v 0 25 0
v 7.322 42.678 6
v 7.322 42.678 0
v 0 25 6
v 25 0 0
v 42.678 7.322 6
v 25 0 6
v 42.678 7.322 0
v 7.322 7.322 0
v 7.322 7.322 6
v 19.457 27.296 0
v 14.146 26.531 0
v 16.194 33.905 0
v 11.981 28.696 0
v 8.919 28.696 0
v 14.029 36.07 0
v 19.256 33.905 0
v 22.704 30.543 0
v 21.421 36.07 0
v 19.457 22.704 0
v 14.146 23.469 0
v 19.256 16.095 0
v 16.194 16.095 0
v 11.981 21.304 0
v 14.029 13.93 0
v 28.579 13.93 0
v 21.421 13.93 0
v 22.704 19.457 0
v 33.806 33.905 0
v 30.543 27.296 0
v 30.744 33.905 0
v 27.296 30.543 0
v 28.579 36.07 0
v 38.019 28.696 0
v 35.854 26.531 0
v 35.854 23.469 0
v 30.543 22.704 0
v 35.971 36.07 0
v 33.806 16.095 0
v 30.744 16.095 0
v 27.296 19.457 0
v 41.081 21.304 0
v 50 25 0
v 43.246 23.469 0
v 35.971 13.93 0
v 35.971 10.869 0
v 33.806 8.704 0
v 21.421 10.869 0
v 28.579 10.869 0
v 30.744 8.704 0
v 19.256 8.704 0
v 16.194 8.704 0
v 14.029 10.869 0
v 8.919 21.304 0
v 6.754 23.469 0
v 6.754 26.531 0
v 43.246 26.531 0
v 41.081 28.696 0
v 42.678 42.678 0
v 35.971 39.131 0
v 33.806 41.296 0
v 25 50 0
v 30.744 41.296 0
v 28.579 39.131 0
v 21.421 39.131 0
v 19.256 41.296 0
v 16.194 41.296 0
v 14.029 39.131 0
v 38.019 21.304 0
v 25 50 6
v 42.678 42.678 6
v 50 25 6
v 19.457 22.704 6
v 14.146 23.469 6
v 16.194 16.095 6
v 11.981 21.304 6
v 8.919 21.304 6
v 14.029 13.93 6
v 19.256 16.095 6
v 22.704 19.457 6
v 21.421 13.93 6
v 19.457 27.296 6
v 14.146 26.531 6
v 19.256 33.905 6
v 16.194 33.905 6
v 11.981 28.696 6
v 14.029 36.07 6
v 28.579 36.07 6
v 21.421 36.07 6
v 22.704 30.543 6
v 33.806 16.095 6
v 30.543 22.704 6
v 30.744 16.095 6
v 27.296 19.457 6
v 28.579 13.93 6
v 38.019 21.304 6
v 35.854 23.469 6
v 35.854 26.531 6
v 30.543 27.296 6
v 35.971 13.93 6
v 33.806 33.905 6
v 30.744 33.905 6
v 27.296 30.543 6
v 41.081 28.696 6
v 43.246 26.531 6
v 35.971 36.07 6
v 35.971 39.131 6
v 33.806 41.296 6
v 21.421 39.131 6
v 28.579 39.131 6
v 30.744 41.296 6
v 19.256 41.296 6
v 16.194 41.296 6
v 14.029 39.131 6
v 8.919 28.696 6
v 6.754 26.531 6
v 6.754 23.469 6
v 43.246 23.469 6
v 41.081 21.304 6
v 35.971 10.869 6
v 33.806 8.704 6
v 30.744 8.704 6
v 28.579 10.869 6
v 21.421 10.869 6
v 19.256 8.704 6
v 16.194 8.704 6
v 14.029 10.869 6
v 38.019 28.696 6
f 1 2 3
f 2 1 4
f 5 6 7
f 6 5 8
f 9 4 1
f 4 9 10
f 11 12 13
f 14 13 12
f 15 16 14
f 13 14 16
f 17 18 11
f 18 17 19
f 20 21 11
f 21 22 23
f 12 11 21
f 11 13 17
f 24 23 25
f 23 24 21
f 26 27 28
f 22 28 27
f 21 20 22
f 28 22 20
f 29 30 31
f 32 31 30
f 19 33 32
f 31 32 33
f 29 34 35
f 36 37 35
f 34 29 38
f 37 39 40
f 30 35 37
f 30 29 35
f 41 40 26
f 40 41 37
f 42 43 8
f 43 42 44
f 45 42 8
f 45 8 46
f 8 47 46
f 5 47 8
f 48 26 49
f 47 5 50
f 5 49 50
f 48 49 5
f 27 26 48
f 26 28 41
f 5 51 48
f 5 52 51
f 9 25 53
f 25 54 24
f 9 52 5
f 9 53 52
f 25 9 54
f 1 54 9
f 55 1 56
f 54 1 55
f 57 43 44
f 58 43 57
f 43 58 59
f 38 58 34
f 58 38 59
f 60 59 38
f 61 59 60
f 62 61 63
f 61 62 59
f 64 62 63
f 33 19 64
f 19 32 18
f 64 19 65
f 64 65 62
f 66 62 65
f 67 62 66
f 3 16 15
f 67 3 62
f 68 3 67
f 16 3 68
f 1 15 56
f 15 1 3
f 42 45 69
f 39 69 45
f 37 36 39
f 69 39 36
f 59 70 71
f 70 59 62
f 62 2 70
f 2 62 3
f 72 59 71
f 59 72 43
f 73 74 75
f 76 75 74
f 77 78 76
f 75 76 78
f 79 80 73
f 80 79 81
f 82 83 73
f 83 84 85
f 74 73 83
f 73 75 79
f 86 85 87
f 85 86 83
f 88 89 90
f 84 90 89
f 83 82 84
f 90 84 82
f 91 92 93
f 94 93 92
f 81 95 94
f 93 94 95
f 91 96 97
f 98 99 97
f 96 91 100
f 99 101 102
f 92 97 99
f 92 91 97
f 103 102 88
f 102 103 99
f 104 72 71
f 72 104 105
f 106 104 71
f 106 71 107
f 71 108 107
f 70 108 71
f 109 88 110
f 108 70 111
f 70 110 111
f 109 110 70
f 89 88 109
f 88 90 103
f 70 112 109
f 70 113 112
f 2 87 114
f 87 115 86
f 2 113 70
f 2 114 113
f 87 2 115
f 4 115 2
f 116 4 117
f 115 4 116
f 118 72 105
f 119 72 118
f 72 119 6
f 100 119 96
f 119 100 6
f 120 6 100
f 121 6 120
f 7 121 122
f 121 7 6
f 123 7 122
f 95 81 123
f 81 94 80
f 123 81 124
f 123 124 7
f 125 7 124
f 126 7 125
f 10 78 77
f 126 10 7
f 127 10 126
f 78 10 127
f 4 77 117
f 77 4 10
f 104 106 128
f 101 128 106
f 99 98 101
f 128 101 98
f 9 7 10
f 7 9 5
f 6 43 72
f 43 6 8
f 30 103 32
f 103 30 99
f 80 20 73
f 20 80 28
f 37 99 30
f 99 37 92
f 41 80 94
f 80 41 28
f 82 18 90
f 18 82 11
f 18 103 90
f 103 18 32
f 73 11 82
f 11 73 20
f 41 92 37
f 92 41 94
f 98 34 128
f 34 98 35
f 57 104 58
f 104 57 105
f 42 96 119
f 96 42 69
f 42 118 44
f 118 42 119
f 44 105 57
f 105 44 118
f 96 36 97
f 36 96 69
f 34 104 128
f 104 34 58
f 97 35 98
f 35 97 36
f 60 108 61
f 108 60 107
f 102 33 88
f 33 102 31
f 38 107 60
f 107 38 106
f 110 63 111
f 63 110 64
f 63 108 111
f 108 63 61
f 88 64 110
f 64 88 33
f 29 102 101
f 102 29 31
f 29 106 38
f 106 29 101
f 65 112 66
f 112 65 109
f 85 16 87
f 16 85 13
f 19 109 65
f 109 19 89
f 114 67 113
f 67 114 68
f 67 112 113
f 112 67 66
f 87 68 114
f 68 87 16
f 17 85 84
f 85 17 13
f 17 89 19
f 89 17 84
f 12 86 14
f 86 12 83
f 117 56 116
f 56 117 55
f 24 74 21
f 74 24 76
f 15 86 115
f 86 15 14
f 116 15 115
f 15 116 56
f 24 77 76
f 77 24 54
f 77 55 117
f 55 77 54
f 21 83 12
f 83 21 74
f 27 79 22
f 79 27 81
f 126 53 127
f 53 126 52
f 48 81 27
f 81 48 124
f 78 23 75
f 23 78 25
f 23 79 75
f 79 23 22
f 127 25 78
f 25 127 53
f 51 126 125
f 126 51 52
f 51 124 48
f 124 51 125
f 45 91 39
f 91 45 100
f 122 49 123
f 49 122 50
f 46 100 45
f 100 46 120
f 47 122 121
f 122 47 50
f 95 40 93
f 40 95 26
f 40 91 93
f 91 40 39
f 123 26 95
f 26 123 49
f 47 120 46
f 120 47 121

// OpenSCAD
$fn = 32;

// ----------------------------------------------------------------------
// Polygon plate: 8-gon R25, 6 bolt windows
// ----------------------------------------------------------------------

// --- parameters (mm) ---
sides = 8;                // number of polygon sides
plate_r = 25;             // circumscribed radius of the polygon
bore_r = 6;               // centre bore radius
bolts = 6;                // number of bolt windows
ring_r = 14.55;           // bolt-circle radius
bolt_r = 4;               // bolt window radius
plate_t = 6;              // plate thickness, Z (extrusion height)

plate_d = 2 * plate_r;  // circumscribed diameter
bore_d = 2 * bore_r;  // centre bore diameter
bolt_d = 2 * bolt_r;  // bolt window diameter
ring_d = 2 * ring_r;  // bolt-circle diameter

profile = [[50, 25], [42.678, 42.678], [25, 50], [7.322, 42.678], [0, 25], [7.322, 7.322], [25, 0], [42.678, 7.322]];  // primary outline, 8 points, counter clockwise
void_1 = [[30.543, 27.296], [27.296, 30.543], [22.704, 30.543], [19.457, 27.296], [19.457, 22.704], [22.704, 19.457], [27.296, 19.457], [30.543, 22.704]];  // centre bore, 8 points
void_2 = [[43.246, 26.531], [41.081, 28.696], [38.019, 28.696], [35.854, 26.531], [35.854, 23.469], [38.019, 21.304], [41.081, 21.304], [43.246, 23.469]];  // bolt window 1, 8 points
void_3 = [[35.971, 39.131], [33.806, 41.296], [30.744, 41.296], [28.579, 39.131], [28.579, 36.07], [30.744, 33.905], [33.806, 33.905], [35.971, 36.07]];  // bolt window 2, 8 points
void_4 = [[21.421, 39.131], [19.256, 41.296], [16.194, 41.296], [14.029, 39.131], [14.029, 36.07], [16.194, 33.905], [19.256, 33.905], [21.421, 36.07]];  // bolt window 3, 8 points
void_5 = [[14.146, 26.531], [11.981, 28.696], [8.919, 28.696], [6.754, 26.531], [6.754, 23.469], [8.919, 21.304], [11.981, 21.304], [14.146, 23.469]];  // bolt window 4, 8 points
void_6 = [[21.421, 13.93], [19.256, 16.095], [16.194, 16.095], [14.029, 13.93], [14.029, 10.869], [16.194, 8.704], [19.256, 8.704], [21.421, 10.869]];  // bolt window 5, 8 points
void_7 = [[35.971, 13.93], [33.806, 16.095], [30.744, 16.095], [28.579, 13.93], [28.579, 10.869], [30.744, 8.704], [33.806, 8.704], [35.971, 10.869]];  // bolt window 6, 8 points

// --- the one profile operation ---
difference() {
  linear_extrude(height = plate_t) polygon(points = profile);
  translate([0, 0, -1])
    linear_extrude(height = plate_t + 2) polygon(points = void_1);
  translate([0, 0, -1])
    linear_extrude(height = plate_t + 2) polygon(points = void_2);
  translate([0, 0, -1])
    linear_extrude(height = plate_t + 2) polygon(points = void_3);
  translate([0, 0, -1])
    linear_extrude(height = plate_t + 2) polygon(points = void_4);
  translate([0, 0, -1])
    linear_extrude(height = plate_t + 2) polygon(points = void_5);
  translate([0, 0, -1])
    linear_extrude(height = plate_t + 2) polygon(points = void_6);
  translate([0, 0, -1])
    linear_extrude(height = plate_t + 2) polygon(points = void_7);
}
